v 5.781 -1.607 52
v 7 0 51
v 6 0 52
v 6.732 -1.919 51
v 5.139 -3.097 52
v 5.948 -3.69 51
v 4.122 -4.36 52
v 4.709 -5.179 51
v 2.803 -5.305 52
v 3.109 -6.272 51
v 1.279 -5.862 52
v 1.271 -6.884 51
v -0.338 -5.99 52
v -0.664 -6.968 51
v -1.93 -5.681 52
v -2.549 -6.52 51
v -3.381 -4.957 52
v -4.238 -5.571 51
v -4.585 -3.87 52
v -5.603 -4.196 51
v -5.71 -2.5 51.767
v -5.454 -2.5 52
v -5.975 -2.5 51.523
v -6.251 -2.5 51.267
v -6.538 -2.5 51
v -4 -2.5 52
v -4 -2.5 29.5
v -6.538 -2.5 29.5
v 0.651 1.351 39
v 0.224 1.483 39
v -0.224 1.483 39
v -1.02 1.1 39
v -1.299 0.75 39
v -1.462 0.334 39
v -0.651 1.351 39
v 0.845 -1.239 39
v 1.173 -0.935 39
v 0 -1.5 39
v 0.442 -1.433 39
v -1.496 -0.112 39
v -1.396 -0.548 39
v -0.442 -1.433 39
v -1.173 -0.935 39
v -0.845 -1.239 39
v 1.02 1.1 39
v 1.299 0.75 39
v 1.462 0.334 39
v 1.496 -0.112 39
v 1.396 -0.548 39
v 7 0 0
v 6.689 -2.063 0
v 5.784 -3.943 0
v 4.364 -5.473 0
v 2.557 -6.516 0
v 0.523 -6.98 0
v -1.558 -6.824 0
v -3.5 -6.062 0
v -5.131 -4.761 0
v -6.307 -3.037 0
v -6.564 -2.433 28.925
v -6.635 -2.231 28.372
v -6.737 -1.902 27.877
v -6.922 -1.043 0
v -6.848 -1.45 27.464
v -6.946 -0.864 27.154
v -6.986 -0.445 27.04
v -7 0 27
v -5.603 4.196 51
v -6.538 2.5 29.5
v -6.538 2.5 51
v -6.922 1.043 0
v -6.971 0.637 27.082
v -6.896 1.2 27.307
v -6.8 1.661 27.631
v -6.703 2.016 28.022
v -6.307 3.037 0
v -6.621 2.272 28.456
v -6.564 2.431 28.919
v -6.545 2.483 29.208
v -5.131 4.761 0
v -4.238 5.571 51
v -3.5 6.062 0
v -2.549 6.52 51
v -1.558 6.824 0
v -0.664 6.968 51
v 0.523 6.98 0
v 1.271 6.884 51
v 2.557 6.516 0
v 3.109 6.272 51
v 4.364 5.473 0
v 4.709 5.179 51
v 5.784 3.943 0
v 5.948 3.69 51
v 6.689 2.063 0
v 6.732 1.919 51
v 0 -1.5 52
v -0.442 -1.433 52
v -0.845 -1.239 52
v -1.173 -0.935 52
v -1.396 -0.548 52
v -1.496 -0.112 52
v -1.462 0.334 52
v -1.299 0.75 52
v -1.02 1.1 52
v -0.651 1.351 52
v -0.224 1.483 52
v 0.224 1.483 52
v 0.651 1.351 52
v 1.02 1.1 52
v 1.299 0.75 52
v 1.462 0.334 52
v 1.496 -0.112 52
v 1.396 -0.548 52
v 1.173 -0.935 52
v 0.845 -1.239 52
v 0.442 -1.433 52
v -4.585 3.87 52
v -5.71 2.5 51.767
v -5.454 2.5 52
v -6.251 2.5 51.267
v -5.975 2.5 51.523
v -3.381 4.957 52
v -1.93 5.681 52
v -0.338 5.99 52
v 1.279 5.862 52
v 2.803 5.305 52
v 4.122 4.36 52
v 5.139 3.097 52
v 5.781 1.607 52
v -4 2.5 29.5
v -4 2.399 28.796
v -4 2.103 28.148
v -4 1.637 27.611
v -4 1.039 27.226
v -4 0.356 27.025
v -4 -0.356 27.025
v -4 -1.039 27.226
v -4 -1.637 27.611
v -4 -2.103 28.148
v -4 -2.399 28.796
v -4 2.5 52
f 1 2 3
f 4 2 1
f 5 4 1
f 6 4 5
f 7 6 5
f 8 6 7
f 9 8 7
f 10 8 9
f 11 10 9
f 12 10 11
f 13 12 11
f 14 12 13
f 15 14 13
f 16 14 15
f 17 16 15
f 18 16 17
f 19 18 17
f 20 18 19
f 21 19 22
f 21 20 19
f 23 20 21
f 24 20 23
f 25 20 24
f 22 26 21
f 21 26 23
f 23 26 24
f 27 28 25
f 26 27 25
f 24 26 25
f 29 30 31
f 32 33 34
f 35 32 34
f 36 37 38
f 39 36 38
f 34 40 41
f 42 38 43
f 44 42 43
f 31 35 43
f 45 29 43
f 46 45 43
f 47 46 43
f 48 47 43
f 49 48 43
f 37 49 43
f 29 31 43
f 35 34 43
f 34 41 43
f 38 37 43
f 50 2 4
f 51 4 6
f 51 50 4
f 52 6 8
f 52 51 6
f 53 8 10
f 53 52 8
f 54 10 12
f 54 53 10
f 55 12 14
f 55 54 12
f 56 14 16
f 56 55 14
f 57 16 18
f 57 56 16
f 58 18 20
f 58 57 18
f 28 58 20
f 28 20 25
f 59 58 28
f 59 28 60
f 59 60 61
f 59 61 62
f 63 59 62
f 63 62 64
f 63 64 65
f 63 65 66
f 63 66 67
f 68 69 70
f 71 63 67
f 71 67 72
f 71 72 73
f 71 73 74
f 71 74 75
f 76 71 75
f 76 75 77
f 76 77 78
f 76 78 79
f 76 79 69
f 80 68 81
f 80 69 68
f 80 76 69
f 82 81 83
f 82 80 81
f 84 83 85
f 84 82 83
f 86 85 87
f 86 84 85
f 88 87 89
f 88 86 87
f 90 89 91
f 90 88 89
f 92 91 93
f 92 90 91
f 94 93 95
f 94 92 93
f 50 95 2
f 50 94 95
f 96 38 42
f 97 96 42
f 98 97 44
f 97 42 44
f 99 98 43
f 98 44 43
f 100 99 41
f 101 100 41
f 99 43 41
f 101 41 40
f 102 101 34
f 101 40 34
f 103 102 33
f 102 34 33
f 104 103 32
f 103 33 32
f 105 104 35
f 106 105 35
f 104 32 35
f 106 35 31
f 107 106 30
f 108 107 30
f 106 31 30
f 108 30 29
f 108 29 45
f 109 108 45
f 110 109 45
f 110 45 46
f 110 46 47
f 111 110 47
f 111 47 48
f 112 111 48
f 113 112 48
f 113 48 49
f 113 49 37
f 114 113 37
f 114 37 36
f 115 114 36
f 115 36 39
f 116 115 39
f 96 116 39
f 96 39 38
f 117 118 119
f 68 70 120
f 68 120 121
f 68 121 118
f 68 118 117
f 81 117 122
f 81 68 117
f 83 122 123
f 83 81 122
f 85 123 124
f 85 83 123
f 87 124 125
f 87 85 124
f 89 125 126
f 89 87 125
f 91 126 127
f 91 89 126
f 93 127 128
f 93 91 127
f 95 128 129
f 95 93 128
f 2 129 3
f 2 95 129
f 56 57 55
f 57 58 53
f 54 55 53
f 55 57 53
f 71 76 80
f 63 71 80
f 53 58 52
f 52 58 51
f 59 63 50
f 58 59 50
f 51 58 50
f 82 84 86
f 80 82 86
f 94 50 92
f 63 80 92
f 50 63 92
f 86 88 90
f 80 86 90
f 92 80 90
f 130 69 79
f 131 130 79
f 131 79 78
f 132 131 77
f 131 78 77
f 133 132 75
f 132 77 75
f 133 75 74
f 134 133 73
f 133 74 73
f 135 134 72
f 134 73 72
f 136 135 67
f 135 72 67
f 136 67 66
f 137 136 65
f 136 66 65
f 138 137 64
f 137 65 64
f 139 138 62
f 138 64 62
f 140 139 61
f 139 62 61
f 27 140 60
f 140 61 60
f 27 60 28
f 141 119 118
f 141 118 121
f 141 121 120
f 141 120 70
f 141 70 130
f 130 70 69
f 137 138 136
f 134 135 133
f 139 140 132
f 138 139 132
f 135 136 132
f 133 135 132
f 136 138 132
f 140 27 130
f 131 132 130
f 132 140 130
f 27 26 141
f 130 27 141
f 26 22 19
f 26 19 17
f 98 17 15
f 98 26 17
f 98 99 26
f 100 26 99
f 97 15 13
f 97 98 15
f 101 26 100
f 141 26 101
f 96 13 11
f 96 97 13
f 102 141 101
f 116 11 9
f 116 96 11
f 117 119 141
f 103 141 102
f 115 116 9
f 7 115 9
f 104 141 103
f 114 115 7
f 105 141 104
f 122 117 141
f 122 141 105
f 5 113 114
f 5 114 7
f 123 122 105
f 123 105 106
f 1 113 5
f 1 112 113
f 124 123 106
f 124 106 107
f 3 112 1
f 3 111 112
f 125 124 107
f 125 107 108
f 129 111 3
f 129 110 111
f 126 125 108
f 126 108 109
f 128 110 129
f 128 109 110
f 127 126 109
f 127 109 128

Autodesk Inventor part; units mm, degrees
ref_plane "XZ Plane" through (0, 0, 0) normal (0, 1, 0) x (-1, 0, 0)
ref_plane "XY Plane" through (0, 0, 0) normal (0, 0, 1) x (1, 0, 0)
sketch "Sketch1" plane through (0, 0, 0) normal (0, 0, 1) x (1, 0, 0)
  circle A0 centre (0, 0) radius 7
  dimension "d0" = 14
extrude "Extrusion1" add sketch "Sketch1" along normal blind 52
hole "Hole1" at (0, 0, 52) direction (0, 0, -1) diameter 3 depth 13
ref_plane "Work Plane1" through (-7, 0, 0) normal (1, 0, 0) x (0, 1, 0)
sketch "Sketch2" plane through (-7, 0, 0) normal (1, 0, 0) x (0, 1, 0)
  line L0 (-2.5, 29.5) -> (-2.5, 52)
  line L1 (-2.5, 52) -> (2.5, 52)
  line L2 (2.5, 52) -> (2.5, 29.5)
  line L3 (7, 52) -> (-7, 52) projected
  line L4 (7, 52) -> (-7, 52) projected
  line L5 (-7, 0) -> (7, 0) projected
  line L6 (7, 0) -> (7, 52) projected
  line L7 (-7, 0) -> (-7, 52) projected
  arc A0 (-2.5, 29.5) -> (2.5, 29.5) centre (0, 29.5) ccw
  point P0 (0, 0)
  point P1 (0, 27)
  dimension "d12" = 5
  dimension "d14" = 0
extrude "Extrusion2" cut sketch "Sketch2" along normal blind 3 contours L0 L1 L2 A0
chamfer "Chamfer1" distance 1 angle 45 2 edges at (1.2711, -6.8836, 52) (1.2711, 6.8836, 52)
properties part number "Shaft" material "Steel"
